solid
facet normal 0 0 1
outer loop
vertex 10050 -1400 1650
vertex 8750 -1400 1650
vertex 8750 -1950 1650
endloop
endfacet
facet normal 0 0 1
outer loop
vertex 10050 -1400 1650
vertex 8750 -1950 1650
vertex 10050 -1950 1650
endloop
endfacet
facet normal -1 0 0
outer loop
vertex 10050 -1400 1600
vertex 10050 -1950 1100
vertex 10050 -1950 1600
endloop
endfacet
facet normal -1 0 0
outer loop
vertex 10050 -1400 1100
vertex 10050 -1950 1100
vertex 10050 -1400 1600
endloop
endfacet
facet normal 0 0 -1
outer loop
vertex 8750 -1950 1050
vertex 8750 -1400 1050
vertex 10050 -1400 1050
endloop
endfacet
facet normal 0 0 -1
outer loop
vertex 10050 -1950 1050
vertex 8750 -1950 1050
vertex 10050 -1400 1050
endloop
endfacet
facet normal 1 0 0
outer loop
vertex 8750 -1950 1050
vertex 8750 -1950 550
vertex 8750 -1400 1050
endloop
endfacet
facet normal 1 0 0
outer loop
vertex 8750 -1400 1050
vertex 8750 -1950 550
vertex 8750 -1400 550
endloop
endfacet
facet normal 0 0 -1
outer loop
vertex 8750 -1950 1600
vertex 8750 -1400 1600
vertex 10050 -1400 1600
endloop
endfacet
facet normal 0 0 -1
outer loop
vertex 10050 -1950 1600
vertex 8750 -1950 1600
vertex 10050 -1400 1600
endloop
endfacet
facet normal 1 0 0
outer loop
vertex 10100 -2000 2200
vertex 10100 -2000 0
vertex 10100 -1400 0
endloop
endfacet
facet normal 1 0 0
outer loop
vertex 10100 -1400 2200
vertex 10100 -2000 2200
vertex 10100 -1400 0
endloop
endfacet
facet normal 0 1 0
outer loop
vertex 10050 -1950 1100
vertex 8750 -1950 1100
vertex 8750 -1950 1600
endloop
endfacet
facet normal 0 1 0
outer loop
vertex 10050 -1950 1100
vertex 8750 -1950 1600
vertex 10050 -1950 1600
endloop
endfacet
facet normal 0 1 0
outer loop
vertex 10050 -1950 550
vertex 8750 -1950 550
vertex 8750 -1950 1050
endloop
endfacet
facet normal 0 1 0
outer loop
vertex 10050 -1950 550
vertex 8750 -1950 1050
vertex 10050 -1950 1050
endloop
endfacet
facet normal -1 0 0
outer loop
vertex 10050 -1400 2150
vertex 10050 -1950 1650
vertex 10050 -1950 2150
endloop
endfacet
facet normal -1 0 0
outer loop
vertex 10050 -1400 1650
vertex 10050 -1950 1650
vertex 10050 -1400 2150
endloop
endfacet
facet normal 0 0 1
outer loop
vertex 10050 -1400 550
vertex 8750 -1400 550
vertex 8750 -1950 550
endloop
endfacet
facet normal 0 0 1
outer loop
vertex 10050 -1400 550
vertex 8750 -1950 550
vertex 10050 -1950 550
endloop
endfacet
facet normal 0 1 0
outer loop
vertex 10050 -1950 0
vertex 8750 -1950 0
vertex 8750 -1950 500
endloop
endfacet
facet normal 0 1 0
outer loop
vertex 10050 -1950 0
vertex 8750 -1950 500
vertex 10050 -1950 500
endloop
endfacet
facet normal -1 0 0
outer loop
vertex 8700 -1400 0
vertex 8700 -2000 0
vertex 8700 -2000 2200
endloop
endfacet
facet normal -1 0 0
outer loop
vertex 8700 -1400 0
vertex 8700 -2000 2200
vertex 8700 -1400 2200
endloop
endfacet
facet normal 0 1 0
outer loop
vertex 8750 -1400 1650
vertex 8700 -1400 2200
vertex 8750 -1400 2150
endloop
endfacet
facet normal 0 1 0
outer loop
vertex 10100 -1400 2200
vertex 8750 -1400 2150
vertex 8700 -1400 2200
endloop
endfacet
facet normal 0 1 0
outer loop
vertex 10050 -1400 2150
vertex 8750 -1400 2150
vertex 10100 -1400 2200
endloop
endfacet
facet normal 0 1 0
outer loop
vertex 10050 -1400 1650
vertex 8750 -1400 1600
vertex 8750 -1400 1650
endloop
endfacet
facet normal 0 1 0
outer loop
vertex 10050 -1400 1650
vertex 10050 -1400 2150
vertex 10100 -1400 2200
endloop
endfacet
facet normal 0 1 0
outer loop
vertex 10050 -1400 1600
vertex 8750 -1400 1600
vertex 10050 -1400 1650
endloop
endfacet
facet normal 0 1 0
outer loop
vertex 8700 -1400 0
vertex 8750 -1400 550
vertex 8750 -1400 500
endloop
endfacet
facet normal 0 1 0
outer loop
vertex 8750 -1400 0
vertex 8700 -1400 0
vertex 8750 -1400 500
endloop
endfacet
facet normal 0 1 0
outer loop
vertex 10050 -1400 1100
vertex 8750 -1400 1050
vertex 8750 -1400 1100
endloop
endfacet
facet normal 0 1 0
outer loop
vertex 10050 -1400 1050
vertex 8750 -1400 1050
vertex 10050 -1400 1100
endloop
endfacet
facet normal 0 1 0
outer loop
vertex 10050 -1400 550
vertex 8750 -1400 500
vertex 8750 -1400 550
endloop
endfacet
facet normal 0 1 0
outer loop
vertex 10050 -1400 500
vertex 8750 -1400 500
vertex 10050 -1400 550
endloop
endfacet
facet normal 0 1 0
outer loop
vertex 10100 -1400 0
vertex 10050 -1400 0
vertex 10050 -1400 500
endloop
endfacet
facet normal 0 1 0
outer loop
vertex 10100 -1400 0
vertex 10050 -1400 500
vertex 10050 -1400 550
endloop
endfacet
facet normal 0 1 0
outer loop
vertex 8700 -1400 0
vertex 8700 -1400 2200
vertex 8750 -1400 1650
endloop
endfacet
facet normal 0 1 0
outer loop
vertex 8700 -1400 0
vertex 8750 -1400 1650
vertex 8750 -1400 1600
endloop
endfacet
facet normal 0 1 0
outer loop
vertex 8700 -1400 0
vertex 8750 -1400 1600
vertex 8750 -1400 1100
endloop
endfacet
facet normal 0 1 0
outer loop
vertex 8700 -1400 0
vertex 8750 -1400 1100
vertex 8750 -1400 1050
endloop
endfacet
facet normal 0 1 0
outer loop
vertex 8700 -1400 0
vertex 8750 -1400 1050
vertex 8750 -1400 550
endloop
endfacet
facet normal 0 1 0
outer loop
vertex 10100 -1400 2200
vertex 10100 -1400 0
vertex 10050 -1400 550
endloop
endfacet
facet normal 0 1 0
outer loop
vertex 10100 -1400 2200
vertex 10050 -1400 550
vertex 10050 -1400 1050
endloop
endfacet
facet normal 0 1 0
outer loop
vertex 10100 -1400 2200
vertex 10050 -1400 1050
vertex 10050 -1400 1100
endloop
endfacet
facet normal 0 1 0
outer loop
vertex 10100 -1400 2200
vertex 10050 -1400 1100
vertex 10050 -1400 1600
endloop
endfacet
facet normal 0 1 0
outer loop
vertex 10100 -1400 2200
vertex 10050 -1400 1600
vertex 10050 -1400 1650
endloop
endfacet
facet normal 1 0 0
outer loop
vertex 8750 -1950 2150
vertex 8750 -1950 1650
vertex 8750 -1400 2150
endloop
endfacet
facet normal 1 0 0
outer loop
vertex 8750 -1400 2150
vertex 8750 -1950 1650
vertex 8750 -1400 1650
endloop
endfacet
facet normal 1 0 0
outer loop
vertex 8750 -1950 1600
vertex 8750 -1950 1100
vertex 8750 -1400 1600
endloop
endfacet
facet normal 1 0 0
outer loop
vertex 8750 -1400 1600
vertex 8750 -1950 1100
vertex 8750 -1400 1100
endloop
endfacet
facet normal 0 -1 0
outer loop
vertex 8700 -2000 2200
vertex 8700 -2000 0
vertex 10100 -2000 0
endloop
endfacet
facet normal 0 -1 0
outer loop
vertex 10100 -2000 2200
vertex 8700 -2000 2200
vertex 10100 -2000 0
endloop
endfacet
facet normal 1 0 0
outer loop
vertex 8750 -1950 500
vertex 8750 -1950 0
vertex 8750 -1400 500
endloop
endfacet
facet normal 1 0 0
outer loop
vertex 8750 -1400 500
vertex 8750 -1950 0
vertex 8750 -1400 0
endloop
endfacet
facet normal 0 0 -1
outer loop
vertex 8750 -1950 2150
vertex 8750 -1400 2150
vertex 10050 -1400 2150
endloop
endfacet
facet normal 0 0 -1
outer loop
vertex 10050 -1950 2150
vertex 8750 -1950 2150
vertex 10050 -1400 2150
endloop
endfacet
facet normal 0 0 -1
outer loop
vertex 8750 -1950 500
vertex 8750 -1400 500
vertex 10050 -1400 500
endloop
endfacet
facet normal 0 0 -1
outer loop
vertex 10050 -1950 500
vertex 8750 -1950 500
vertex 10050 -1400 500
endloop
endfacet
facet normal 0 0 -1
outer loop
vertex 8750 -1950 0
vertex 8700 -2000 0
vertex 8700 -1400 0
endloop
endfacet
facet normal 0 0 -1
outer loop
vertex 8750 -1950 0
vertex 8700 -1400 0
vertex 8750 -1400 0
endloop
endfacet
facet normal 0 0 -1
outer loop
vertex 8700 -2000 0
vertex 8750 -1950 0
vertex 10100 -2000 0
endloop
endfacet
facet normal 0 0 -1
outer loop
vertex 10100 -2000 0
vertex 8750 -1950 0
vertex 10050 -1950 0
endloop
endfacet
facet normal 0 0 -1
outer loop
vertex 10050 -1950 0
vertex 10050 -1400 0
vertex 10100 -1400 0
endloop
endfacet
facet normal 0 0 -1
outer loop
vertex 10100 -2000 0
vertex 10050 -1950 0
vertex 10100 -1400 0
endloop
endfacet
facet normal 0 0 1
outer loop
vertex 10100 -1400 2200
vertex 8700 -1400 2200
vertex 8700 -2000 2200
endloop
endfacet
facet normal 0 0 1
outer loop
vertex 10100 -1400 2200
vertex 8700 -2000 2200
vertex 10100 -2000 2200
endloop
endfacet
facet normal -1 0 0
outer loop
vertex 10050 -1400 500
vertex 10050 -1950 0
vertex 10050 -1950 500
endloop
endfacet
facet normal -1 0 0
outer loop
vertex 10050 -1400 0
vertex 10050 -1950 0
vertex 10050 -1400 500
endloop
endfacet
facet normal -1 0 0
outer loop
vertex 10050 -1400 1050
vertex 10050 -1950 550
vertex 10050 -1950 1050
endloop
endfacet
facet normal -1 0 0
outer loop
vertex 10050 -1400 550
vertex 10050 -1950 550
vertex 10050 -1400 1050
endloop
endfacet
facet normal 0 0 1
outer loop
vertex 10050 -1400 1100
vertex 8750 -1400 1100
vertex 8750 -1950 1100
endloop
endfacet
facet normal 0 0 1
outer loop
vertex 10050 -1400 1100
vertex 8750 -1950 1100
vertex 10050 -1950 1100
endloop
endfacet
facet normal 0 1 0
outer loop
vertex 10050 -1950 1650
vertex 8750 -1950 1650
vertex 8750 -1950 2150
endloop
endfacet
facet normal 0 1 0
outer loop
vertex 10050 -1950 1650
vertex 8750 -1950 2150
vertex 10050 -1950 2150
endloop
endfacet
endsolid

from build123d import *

# Parameters (mm, degrees)
BOX3525_W        = 1300
BOX3525_H        = 550
BOX3525_DEPTH    = 500
ARRAY280_Z_COUNT = 4
ARRAY280_Z_PITCH = 550
BOX3524_W        = 1400
BOX3524_H        = 600
BOX3524_DEPTH    = 2200


with BuildPart() as array280:
    # Box3525 → Box3525 (new body)
    with BuildSketch(Plane(origin=(8750, -1950, 0), x_dir=(1, 0, 0), z_dir=(0, 0, 1))):
        with Locations((650, 275)):
            Rectangle(BOX3525_W, BOX3525_H)
    extrude(amount=BOX3525_DEPTH)

    # Array280 Z: Array280 ×4


with BuildPart() as array280_1:
    add(array280.part)
    with Locations(*[(0, 0, i * ARRAY280_Z_PITCH) for i in range(1, ARRAY280_Z_COUNT)]):
        add(array280.part)


with BuildPart() as cut002:
    # Box3524 → Box3524 (new body)
    with BuildSketch(Plane(origin=(8700, -2000, 0), x_dir=(1, 0, 0), z_dir=(0, 0, 1))):
        with Locations((700, 300)):
            Rectangle(BOX3524_W, BOX3524_H)
    extrude(amount=BOX3524_DEPTH)

    # Cut002: cut Array280
    add(array280_1.part, mode=Mode.SUBTRACT)


solid = cut002.part
